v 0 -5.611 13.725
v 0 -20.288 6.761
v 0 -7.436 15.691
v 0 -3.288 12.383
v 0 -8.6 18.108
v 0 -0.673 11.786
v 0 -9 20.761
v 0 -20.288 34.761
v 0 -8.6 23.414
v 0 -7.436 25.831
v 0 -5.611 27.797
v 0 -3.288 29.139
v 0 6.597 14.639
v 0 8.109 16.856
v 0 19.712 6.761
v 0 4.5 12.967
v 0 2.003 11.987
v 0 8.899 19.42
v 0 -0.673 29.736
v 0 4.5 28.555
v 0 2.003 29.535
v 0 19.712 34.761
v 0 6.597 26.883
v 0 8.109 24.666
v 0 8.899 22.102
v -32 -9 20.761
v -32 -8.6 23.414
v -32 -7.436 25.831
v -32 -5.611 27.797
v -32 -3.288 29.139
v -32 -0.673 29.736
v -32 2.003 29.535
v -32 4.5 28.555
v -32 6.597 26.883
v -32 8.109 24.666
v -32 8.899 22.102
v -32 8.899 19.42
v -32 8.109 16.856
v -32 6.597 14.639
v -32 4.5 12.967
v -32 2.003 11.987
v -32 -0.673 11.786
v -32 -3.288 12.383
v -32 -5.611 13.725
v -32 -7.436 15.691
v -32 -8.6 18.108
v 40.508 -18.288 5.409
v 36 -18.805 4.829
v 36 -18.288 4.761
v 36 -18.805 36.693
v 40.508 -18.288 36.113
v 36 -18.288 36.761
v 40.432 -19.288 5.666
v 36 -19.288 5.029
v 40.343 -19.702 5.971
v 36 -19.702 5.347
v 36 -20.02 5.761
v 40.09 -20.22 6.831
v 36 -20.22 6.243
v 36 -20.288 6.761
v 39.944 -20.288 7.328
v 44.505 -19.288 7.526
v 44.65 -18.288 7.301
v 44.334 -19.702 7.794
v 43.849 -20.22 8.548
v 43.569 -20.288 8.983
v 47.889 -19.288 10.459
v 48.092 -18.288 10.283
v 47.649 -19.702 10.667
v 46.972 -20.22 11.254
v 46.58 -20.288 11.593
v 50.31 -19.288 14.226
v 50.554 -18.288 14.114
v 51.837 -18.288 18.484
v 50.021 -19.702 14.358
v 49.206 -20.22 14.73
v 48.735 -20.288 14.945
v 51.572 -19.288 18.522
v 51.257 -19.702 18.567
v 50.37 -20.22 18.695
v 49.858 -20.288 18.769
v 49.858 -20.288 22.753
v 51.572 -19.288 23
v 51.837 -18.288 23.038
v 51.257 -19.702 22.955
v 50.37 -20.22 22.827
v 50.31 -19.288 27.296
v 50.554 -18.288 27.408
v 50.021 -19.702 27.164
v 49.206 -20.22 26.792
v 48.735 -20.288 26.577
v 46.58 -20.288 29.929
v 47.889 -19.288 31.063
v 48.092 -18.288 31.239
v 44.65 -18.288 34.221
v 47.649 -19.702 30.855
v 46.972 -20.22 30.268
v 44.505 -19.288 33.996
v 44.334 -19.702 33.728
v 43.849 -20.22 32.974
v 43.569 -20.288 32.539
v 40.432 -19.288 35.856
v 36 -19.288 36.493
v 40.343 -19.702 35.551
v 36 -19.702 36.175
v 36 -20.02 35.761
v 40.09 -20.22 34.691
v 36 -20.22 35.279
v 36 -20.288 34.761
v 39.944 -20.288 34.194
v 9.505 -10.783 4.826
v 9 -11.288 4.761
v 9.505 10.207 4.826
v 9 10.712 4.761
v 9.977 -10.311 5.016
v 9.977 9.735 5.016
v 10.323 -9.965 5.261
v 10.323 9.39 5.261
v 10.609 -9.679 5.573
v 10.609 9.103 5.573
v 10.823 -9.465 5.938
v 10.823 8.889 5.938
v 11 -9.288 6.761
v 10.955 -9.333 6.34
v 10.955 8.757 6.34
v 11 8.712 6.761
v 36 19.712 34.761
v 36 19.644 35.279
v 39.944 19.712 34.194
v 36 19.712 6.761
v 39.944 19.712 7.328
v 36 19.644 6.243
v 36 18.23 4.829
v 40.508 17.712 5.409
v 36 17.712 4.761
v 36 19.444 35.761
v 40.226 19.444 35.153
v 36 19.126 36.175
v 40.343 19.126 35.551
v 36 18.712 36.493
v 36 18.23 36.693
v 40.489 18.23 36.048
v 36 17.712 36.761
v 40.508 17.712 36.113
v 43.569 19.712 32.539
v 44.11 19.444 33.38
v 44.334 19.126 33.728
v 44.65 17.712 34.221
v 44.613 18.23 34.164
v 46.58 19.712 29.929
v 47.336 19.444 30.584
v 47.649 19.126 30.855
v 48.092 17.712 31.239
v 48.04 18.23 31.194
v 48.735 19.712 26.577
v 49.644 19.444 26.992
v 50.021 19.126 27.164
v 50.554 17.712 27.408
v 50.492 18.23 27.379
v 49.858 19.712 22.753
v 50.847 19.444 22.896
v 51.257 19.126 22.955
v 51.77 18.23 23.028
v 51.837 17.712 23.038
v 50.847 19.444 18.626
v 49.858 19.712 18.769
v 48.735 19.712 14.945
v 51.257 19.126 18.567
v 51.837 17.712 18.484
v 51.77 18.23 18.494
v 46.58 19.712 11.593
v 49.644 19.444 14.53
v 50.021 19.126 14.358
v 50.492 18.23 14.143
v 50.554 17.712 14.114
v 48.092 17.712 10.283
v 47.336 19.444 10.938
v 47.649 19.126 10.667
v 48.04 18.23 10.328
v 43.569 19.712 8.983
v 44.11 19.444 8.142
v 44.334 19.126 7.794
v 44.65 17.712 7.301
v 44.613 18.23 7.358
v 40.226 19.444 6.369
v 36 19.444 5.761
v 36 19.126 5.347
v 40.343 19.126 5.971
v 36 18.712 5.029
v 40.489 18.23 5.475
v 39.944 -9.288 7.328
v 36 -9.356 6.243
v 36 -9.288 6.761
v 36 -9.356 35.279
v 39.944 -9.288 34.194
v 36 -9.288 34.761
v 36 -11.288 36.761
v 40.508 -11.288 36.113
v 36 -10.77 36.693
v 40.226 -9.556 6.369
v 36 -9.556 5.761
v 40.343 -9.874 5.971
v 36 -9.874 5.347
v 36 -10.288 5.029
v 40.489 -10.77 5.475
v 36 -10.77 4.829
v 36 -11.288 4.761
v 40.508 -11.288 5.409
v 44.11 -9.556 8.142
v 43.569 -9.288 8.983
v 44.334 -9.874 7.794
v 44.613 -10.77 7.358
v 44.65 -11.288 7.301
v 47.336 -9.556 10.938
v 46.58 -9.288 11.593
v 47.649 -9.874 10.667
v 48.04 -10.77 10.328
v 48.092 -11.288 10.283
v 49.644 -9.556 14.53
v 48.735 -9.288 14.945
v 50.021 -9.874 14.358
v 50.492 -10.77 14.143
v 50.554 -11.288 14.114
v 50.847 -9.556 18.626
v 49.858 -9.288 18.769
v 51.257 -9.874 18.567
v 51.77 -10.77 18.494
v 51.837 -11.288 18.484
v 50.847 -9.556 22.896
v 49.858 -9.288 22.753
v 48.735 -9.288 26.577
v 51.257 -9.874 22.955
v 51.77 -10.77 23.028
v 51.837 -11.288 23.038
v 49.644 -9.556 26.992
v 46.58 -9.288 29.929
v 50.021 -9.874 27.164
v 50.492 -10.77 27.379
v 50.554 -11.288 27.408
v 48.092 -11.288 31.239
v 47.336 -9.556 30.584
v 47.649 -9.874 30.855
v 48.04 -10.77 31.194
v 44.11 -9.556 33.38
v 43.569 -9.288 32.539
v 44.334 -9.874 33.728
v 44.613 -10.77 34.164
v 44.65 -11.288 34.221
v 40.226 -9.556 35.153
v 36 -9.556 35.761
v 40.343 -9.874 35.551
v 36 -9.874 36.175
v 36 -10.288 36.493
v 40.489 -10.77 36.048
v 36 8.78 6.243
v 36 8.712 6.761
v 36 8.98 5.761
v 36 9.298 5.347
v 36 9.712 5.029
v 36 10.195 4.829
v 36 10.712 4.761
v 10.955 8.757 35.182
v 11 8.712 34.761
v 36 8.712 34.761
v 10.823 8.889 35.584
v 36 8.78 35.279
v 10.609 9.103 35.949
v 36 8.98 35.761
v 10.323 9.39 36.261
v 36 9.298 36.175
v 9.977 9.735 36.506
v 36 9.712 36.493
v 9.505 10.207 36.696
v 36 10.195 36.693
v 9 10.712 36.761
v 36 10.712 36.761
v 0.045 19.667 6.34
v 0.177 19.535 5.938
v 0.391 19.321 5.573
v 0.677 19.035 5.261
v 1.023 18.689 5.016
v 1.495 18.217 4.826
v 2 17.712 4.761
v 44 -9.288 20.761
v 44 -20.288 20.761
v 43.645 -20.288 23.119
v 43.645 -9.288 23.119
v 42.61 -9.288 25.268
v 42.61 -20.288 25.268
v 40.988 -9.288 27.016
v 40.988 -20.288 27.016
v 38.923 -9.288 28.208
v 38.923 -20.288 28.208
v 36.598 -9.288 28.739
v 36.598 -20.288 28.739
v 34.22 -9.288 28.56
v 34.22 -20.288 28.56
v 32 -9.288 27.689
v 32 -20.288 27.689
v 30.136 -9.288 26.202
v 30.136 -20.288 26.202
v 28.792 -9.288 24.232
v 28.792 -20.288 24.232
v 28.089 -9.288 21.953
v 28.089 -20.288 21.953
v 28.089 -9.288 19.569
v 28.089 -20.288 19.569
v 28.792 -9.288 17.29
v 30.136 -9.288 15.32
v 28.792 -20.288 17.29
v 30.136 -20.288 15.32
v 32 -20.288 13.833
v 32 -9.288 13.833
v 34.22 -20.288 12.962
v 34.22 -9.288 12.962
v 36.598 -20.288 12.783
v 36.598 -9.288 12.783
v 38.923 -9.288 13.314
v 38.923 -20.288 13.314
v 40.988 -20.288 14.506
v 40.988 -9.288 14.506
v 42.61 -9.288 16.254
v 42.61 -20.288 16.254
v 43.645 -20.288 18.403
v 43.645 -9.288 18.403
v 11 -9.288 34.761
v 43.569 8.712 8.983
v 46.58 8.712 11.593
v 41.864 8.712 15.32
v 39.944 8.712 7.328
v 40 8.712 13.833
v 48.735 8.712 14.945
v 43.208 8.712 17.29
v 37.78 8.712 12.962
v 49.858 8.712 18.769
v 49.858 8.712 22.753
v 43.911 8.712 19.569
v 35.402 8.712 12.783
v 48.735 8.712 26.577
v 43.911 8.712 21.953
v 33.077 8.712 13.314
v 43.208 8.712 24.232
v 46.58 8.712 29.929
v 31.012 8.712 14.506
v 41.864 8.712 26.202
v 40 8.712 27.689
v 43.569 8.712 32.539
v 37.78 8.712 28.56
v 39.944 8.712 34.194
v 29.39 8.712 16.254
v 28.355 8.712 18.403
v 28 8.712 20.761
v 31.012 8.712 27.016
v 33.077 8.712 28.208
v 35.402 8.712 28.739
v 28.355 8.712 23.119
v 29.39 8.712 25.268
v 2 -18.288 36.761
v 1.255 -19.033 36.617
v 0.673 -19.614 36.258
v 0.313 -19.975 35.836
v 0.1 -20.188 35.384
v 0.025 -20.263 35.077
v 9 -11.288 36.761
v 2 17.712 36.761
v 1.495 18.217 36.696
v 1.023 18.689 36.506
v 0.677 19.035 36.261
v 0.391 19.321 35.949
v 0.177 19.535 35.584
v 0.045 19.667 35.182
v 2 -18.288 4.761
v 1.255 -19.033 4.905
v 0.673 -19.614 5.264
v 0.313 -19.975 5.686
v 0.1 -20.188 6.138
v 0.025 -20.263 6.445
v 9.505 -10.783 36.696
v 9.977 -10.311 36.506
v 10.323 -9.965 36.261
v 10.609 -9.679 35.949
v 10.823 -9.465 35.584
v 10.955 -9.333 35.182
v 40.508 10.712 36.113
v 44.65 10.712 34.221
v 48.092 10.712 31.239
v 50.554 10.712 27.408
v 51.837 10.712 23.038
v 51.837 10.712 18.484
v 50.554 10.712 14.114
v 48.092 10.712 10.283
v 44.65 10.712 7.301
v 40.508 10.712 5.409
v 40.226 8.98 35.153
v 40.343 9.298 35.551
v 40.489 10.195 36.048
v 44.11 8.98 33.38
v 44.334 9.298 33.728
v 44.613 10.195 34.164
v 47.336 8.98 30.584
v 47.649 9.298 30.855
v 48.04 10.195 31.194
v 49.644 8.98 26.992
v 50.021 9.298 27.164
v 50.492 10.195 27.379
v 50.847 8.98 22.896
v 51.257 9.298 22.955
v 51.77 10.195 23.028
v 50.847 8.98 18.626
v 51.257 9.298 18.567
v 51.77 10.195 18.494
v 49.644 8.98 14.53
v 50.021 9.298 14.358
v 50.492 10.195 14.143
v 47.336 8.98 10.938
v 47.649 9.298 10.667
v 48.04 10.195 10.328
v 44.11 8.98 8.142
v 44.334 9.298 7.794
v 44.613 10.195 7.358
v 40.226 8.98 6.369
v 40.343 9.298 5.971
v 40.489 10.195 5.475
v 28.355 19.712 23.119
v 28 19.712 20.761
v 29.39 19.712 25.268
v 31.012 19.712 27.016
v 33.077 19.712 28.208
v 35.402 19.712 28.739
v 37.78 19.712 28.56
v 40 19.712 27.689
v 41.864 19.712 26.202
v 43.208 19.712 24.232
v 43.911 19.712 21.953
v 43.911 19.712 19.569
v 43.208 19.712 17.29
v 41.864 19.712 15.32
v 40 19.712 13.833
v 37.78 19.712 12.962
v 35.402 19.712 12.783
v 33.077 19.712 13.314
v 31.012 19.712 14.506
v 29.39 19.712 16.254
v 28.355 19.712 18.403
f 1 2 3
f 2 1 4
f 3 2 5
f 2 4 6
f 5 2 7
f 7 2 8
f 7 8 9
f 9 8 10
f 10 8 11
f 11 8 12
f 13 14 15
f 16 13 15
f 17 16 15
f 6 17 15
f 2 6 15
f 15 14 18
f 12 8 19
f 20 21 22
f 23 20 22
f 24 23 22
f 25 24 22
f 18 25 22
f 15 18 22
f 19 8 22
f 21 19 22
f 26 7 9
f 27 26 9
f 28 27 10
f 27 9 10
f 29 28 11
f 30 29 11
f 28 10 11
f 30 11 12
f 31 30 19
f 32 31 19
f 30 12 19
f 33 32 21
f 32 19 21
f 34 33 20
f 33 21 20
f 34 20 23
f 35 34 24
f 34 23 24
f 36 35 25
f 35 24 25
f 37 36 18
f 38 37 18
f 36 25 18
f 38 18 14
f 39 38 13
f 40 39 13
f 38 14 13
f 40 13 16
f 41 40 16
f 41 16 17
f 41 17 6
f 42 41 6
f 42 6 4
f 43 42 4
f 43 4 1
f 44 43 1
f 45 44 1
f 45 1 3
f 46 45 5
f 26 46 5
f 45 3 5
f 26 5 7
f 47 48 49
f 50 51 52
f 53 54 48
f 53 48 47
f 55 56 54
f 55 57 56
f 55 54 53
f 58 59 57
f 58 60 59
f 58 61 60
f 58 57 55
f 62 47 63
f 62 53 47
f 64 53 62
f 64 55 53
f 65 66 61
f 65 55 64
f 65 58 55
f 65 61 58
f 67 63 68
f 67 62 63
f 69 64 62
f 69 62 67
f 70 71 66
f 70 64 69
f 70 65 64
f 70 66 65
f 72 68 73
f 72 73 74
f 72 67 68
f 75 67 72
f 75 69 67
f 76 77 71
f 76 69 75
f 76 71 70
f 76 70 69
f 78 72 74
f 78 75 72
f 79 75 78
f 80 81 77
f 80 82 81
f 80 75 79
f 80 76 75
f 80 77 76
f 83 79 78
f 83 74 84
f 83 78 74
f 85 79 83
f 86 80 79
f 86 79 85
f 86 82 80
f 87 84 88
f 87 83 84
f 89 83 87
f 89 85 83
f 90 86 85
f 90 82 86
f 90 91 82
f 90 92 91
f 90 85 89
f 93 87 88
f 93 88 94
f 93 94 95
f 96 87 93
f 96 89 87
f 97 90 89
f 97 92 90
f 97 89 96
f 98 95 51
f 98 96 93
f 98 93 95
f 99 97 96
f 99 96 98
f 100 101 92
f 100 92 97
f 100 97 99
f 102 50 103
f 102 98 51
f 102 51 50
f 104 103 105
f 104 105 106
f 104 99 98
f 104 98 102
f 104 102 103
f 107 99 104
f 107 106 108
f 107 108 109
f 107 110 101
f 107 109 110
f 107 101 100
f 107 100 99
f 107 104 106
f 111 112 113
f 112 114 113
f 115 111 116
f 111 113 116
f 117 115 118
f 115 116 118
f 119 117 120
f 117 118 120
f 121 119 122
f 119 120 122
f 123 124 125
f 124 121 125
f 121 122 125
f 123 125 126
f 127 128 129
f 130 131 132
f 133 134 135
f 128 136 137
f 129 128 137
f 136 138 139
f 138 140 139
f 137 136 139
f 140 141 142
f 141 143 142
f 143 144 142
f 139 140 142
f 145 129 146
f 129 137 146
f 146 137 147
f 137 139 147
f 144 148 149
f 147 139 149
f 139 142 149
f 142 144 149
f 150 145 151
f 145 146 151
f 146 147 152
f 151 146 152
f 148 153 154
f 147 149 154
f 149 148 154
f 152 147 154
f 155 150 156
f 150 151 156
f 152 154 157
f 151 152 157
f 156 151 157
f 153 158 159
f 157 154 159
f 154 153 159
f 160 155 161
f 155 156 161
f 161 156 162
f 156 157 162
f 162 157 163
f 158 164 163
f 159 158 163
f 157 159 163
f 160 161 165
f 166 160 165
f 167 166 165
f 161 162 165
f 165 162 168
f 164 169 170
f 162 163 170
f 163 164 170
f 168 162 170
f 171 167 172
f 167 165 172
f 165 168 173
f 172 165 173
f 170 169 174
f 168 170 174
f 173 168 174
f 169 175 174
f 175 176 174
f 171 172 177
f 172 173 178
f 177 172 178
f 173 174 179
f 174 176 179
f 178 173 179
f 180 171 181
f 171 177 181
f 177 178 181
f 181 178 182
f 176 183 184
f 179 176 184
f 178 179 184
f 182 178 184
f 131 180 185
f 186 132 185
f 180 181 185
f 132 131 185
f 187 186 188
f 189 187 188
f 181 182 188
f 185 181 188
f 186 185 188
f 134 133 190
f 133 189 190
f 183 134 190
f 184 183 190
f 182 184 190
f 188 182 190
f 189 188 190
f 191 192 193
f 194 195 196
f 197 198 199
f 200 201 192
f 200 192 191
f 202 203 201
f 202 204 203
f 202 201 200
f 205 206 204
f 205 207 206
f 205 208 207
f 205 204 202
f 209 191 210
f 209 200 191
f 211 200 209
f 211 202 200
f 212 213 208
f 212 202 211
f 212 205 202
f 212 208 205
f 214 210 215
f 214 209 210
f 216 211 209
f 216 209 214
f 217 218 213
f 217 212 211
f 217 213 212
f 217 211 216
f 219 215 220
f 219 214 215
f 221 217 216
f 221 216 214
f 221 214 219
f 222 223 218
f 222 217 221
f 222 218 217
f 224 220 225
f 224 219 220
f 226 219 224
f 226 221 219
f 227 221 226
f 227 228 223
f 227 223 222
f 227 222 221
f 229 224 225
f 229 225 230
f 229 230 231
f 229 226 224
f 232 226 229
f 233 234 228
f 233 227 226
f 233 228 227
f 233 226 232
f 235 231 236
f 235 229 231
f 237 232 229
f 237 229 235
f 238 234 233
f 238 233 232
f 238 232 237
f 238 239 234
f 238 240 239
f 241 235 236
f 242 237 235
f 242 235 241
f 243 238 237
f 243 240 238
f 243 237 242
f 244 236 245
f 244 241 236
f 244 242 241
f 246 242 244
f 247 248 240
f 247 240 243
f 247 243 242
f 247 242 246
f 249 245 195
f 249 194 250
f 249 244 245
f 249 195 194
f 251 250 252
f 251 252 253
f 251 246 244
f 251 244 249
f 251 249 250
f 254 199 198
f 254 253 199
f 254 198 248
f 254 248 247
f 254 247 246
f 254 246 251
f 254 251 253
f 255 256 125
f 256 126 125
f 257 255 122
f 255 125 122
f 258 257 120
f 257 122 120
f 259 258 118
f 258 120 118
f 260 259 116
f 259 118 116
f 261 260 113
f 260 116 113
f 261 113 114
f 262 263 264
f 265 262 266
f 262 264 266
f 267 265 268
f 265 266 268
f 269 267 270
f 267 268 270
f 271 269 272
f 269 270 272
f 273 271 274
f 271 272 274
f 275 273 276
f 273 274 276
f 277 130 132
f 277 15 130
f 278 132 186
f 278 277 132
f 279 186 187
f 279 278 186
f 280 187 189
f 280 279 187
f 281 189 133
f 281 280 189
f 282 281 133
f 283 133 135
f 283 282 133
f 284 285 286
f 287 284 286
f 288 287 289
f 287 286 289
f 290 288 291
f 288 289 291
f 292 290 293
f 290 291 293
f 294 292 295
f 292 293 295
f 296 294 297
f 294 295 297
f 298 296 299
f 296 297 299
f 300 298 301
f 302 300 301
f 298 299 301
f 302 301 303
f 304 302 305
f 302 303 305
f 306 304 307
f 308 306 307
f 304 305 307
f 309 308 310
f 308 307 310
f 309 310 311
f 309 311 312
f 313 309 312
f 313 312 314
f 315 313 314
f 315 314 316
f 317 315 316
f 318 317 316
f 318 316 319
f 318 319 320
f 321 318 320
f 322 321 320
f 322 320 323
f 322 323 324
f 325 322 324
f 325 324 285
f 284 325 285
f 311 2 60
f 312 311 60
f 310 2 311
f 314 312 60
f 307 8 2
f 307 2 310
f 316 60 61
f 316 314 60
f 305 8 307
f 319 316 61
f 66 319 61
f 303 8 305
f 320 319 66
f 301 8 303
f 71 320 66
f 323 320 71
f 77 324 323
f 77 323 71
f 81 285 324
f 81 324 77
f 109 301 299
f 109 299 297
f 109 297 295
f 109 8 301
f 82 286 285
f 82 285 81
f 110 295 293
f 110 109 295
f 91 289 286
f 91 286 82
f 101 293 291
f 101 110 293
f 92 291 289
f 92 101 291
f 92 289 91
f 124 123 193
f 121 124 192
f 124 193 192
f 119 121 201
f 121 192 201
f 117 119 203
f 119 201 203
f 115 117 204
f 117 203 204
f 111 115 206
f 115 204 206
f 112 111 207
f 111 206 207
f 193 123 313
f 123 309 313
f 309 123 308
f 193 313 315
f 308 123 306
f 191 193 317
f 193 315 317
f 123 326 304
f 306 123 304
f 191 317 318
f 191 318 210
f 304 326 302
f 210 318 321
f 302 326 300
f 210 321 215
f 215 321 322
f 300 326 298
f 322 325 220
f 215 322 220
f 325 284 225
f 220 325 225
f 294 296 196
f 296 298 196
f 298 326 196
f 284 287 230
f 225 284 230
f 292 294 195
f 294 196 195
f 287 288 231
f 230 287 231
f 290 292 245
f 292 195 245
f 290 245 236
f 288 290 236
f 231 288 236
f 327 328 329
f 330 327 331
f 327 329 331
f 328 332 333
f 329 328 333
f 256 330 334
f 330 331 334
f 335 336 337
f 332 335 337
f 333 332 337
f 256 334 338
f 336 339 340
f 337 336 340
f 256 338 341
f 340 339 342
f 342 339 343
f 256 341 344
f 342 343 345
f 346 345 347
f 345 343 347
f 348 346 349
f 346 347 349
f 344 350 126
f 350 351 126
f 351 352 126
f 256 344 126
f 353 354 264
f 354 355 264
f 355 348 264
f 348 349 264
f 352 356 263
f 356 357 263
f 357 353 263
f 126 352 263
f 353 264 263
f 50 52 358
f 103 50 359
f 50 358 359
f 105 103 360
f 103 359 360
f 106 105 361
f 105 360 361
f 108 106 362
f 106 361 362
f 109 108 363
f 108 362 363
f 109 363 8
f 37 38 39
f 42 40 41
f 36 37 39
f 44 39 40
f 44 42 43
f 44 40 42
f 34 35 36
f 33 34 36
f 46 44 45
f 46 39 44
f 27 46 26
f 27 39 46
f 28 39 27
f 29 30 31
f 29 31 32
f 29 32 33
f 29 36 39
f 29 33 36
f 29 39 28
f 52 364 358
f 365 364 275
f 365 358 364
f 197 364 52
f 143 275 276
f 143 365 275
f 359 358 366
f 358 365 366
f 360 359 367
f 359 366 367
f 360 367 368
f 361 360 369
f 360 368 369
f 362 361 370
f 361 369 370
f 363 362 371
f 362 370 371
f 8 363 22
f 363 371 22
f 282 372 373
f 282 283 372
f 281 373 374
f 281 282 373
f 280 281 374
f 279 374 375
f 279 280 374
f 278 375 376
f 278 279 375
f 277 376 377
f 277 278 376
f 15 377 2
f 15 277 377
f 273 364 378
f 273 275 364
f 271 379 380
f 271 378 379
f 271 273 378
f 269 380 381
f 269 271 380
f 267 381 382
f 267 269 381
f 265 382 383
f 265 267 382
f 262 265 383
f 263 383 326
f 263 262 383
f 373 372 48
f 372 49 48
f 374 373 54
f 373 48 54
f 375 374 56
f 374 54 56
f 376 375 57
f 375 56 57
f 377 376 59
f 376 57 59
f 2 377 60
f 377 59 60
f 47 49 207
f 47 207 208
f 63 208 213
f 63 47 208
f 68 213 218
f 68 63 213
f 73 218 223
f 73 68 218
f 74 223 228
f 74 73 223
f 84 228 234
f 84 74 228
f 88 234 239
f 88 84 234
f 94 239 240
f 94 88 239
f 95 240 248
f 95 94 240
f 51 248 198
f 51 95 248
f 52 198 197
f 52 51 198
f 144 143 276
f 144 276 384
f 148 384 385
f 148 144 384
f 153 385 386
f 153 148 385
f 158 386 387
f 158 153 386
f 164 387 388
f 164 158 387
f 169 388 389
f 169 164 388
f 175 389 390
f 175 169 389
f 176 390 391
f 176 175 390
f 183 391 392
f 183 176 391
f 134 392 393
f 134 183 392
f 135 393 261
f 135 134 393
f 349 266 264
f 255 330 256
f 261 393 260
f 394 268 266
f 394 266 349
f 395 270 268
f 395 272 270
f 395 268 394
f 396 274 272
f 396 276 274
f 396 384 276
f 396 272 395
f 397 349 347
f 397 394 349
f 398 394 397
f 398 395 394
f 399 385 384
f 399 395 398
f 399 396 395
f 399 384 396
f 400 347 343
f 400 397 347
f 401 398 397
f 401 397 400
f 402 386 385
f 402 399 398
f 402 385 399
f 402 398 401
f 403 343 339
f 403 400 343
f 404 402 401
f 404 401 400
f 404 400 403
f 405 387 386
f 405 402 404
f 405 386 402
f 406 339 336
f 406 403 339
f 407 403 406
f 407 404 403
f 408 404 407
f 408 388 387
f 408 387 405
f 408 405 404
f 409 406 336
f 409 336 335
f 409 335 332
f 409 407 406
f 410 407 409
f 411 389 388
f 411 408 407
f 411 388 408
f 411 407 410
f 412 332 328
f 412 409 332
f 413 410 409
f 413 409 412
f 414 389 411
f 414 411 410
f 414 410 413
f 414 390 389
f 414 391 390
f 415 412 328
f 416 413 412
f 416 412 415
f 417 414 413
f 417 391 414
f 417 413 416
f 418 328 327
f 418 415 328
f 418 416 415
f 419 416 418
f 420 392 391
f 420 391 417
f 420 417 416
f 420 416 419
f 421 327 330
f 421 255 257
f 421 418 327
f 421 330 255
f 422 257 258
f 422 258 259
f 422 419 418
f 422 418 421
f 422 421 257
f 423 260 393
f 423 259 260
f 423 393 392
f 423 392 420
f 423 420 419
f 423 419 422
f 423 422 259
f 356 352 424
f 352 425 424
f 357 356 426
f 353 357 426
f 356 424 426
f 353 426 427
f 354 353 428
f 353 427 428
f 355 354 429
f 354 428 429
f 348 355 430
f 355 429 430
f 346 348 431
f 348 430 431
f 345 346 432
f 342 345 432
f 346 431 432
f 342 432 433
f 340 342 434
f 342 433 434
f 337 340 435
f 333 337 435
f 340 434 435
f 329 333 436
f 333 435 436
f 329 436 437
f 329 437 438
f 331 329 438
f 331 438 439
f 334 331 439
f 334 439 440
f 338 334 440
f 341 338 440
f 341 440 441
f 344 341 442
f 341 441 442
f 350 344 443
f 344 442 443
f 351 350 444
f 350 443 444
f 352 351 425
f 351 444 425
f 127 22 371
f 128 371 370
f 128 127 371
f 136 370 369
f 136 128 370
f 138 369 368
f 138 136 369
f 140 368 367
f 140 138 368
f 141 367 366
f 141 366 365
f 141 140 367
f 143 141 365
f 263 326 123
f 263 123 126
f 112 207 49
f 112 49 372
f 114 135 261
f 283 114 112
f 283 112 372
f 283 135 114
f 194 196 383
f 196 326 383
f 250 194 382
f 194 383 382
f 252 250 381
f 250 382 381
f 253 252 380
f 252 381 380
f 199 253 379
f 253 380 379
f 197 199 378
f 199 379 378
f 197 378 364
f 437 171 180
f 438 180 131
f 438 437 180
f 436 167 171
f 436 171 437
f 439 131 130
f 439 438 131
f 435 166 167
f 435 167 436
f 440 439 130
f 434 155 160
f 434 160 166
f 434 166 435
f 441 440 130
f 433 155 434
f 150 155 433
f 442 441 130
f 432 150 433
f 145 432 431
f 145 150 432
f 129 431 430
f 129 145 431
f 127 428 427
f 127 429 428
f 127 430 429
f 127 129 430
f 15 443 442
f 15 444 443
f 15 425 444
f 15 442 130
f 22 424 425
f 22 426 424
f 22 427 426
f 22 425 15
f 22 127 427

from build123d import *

# Parameters (mm, degrees)
F0_W      = 40
F0_H      = 32
F1_DEPTH  = 11
F3_DEPTH  = 11
F4_R      = 8
F5_DEPTH  = 76.2
F7_DEPTH  = 11
F8_R      = 8
F9_DEPTH  = 76.2
F10_R     = 2
F11_R     = 9
F12_DEPTH = 32
F13_R     = 8
F14_DEPTH = 36.068


with BuildPart() as f1:
    # F0 (on Right) → F1 (new body)
    with BuildSketch(Plane.YZ):
        with Locations((-0.2878075466, 20.7610073336)):
            Rectangle(F0_W, F0_H)
    extrude(amount=F1_DEPTH)

    # F2 (on face) → F3 (join)
    with BuildSketch(Plane.XZ.offset(20.2878075466)):
        with BuildLine():
            Line((11, 36.7610073336), (11, 4.7610073336))
            Line((11, 4.7610073336), (36, 4.7610073336))
            ThreePointArc((36, 4.7610073336), (52, 20.7610073336), (36, 36.7610073336))
            Line((36, 36.7610073336), (11, 36.7610073336))
        make_face()
    extrude(amount=-F3_DEPTH)

    # F4 (on face) → F5 (cut)
    with BuildSketch(Plane.XZ.offset(20.2878075466)):
        with Locations((36, 20.7610073336)):
            Circle(F4_R)
    extrude(amount=-F5_DEPTH, mode=Mode.SUBTRACT)

    # F6 (on face) → F7 (join)
    with BuildSketch(Plane(origin=(0, 19.7121924534, 0), x_dir=(-1, 0, 0), z_dir=(0, 1, 0))):
        with BuildLine():
            Line((-11, 4.7610073336), (-11, 36.7610073336))
            Line((-11, 36.7610073336), (-36, 36.7610073336))
            ThreePointArc((-36, 36.7610073336), (-52, 20.7610073336), (-36, 4.7610073336))
            Line((-36, 4.7610073336), (-11, 4.7610073336))
        make_face()
    extrude(amount=-F7_DEPTH)

    # F8 (on face) → F9 (cut)
    with BuildSketch(Plane(origin=(0, 19.7121924534, 0), x_dir=(-1, 0, 0), z_dir=(0, 1, 0))):
        with Locations((-36, 20.7610073336)):
            Circle(F8_R)
    extrude(amount=-F9_DEPTH, mode=Mode.SUBTRACT)

    # F10
    f10_edges = [f1.edges().sort_by_distance(p)[0] for p in [
        (36, 14.212192, 36.761007),
        (36, 14.212192, 4.761007),
        (52, 19.712192, 20.761007),
        (52, 8.712192, 20.761007),
        (36, -14.787808, 4.761007),
        (36, -14.787808, 36.761007),
        (52, -20.287808, 20.761007),
        (52, -9.287808, 20.761007),
        (18, 19.712192, 36.761007),
        (23.5, 8.712192, 36.761007),
        (11, -0.287808, 36.761007),
        (23.5, -9.287808, 36.761007),
        (18, -20.287808, 36.761007),
        (0, -0.287808, 36.761007),
        (18, -20.287808, 4.761007),
        (23.5, -9.287808, 4.761007),
        (11, -0.287808, 4.761007),
        (23.5, 8.712192, 4.761007),
        (18, 19.712192, 4.761007),
        (0, -0.287808, 4.761007),
    ]]
    fillet(f10_edges, radius=F10_R)

    # F11 (on face) → F12 (join)
    with BuildSketch(Plane(origin=(0, 0, 0), x_dir=(0, -1, 0), z_dir=(-1, 0, 0))):
        with Locations((0, 20.7610073336)):
            Circle(F11_R)
    extrude(amount=F12_DEPTH)

    # F13 (on face) → F14 (cut)
    with BuildSketch(Plane(origin=(0, 19.7121924534, 0), x_dir=(-1, 0, 0), z_dir=(0, 1, 0))):
        with Locations((-36, 20.7610073336)):
            Circle(F13_R)
    extrude(amount=-F14_DEPTH, mode=Mode.SUBTRACT)


solid = f1.part
